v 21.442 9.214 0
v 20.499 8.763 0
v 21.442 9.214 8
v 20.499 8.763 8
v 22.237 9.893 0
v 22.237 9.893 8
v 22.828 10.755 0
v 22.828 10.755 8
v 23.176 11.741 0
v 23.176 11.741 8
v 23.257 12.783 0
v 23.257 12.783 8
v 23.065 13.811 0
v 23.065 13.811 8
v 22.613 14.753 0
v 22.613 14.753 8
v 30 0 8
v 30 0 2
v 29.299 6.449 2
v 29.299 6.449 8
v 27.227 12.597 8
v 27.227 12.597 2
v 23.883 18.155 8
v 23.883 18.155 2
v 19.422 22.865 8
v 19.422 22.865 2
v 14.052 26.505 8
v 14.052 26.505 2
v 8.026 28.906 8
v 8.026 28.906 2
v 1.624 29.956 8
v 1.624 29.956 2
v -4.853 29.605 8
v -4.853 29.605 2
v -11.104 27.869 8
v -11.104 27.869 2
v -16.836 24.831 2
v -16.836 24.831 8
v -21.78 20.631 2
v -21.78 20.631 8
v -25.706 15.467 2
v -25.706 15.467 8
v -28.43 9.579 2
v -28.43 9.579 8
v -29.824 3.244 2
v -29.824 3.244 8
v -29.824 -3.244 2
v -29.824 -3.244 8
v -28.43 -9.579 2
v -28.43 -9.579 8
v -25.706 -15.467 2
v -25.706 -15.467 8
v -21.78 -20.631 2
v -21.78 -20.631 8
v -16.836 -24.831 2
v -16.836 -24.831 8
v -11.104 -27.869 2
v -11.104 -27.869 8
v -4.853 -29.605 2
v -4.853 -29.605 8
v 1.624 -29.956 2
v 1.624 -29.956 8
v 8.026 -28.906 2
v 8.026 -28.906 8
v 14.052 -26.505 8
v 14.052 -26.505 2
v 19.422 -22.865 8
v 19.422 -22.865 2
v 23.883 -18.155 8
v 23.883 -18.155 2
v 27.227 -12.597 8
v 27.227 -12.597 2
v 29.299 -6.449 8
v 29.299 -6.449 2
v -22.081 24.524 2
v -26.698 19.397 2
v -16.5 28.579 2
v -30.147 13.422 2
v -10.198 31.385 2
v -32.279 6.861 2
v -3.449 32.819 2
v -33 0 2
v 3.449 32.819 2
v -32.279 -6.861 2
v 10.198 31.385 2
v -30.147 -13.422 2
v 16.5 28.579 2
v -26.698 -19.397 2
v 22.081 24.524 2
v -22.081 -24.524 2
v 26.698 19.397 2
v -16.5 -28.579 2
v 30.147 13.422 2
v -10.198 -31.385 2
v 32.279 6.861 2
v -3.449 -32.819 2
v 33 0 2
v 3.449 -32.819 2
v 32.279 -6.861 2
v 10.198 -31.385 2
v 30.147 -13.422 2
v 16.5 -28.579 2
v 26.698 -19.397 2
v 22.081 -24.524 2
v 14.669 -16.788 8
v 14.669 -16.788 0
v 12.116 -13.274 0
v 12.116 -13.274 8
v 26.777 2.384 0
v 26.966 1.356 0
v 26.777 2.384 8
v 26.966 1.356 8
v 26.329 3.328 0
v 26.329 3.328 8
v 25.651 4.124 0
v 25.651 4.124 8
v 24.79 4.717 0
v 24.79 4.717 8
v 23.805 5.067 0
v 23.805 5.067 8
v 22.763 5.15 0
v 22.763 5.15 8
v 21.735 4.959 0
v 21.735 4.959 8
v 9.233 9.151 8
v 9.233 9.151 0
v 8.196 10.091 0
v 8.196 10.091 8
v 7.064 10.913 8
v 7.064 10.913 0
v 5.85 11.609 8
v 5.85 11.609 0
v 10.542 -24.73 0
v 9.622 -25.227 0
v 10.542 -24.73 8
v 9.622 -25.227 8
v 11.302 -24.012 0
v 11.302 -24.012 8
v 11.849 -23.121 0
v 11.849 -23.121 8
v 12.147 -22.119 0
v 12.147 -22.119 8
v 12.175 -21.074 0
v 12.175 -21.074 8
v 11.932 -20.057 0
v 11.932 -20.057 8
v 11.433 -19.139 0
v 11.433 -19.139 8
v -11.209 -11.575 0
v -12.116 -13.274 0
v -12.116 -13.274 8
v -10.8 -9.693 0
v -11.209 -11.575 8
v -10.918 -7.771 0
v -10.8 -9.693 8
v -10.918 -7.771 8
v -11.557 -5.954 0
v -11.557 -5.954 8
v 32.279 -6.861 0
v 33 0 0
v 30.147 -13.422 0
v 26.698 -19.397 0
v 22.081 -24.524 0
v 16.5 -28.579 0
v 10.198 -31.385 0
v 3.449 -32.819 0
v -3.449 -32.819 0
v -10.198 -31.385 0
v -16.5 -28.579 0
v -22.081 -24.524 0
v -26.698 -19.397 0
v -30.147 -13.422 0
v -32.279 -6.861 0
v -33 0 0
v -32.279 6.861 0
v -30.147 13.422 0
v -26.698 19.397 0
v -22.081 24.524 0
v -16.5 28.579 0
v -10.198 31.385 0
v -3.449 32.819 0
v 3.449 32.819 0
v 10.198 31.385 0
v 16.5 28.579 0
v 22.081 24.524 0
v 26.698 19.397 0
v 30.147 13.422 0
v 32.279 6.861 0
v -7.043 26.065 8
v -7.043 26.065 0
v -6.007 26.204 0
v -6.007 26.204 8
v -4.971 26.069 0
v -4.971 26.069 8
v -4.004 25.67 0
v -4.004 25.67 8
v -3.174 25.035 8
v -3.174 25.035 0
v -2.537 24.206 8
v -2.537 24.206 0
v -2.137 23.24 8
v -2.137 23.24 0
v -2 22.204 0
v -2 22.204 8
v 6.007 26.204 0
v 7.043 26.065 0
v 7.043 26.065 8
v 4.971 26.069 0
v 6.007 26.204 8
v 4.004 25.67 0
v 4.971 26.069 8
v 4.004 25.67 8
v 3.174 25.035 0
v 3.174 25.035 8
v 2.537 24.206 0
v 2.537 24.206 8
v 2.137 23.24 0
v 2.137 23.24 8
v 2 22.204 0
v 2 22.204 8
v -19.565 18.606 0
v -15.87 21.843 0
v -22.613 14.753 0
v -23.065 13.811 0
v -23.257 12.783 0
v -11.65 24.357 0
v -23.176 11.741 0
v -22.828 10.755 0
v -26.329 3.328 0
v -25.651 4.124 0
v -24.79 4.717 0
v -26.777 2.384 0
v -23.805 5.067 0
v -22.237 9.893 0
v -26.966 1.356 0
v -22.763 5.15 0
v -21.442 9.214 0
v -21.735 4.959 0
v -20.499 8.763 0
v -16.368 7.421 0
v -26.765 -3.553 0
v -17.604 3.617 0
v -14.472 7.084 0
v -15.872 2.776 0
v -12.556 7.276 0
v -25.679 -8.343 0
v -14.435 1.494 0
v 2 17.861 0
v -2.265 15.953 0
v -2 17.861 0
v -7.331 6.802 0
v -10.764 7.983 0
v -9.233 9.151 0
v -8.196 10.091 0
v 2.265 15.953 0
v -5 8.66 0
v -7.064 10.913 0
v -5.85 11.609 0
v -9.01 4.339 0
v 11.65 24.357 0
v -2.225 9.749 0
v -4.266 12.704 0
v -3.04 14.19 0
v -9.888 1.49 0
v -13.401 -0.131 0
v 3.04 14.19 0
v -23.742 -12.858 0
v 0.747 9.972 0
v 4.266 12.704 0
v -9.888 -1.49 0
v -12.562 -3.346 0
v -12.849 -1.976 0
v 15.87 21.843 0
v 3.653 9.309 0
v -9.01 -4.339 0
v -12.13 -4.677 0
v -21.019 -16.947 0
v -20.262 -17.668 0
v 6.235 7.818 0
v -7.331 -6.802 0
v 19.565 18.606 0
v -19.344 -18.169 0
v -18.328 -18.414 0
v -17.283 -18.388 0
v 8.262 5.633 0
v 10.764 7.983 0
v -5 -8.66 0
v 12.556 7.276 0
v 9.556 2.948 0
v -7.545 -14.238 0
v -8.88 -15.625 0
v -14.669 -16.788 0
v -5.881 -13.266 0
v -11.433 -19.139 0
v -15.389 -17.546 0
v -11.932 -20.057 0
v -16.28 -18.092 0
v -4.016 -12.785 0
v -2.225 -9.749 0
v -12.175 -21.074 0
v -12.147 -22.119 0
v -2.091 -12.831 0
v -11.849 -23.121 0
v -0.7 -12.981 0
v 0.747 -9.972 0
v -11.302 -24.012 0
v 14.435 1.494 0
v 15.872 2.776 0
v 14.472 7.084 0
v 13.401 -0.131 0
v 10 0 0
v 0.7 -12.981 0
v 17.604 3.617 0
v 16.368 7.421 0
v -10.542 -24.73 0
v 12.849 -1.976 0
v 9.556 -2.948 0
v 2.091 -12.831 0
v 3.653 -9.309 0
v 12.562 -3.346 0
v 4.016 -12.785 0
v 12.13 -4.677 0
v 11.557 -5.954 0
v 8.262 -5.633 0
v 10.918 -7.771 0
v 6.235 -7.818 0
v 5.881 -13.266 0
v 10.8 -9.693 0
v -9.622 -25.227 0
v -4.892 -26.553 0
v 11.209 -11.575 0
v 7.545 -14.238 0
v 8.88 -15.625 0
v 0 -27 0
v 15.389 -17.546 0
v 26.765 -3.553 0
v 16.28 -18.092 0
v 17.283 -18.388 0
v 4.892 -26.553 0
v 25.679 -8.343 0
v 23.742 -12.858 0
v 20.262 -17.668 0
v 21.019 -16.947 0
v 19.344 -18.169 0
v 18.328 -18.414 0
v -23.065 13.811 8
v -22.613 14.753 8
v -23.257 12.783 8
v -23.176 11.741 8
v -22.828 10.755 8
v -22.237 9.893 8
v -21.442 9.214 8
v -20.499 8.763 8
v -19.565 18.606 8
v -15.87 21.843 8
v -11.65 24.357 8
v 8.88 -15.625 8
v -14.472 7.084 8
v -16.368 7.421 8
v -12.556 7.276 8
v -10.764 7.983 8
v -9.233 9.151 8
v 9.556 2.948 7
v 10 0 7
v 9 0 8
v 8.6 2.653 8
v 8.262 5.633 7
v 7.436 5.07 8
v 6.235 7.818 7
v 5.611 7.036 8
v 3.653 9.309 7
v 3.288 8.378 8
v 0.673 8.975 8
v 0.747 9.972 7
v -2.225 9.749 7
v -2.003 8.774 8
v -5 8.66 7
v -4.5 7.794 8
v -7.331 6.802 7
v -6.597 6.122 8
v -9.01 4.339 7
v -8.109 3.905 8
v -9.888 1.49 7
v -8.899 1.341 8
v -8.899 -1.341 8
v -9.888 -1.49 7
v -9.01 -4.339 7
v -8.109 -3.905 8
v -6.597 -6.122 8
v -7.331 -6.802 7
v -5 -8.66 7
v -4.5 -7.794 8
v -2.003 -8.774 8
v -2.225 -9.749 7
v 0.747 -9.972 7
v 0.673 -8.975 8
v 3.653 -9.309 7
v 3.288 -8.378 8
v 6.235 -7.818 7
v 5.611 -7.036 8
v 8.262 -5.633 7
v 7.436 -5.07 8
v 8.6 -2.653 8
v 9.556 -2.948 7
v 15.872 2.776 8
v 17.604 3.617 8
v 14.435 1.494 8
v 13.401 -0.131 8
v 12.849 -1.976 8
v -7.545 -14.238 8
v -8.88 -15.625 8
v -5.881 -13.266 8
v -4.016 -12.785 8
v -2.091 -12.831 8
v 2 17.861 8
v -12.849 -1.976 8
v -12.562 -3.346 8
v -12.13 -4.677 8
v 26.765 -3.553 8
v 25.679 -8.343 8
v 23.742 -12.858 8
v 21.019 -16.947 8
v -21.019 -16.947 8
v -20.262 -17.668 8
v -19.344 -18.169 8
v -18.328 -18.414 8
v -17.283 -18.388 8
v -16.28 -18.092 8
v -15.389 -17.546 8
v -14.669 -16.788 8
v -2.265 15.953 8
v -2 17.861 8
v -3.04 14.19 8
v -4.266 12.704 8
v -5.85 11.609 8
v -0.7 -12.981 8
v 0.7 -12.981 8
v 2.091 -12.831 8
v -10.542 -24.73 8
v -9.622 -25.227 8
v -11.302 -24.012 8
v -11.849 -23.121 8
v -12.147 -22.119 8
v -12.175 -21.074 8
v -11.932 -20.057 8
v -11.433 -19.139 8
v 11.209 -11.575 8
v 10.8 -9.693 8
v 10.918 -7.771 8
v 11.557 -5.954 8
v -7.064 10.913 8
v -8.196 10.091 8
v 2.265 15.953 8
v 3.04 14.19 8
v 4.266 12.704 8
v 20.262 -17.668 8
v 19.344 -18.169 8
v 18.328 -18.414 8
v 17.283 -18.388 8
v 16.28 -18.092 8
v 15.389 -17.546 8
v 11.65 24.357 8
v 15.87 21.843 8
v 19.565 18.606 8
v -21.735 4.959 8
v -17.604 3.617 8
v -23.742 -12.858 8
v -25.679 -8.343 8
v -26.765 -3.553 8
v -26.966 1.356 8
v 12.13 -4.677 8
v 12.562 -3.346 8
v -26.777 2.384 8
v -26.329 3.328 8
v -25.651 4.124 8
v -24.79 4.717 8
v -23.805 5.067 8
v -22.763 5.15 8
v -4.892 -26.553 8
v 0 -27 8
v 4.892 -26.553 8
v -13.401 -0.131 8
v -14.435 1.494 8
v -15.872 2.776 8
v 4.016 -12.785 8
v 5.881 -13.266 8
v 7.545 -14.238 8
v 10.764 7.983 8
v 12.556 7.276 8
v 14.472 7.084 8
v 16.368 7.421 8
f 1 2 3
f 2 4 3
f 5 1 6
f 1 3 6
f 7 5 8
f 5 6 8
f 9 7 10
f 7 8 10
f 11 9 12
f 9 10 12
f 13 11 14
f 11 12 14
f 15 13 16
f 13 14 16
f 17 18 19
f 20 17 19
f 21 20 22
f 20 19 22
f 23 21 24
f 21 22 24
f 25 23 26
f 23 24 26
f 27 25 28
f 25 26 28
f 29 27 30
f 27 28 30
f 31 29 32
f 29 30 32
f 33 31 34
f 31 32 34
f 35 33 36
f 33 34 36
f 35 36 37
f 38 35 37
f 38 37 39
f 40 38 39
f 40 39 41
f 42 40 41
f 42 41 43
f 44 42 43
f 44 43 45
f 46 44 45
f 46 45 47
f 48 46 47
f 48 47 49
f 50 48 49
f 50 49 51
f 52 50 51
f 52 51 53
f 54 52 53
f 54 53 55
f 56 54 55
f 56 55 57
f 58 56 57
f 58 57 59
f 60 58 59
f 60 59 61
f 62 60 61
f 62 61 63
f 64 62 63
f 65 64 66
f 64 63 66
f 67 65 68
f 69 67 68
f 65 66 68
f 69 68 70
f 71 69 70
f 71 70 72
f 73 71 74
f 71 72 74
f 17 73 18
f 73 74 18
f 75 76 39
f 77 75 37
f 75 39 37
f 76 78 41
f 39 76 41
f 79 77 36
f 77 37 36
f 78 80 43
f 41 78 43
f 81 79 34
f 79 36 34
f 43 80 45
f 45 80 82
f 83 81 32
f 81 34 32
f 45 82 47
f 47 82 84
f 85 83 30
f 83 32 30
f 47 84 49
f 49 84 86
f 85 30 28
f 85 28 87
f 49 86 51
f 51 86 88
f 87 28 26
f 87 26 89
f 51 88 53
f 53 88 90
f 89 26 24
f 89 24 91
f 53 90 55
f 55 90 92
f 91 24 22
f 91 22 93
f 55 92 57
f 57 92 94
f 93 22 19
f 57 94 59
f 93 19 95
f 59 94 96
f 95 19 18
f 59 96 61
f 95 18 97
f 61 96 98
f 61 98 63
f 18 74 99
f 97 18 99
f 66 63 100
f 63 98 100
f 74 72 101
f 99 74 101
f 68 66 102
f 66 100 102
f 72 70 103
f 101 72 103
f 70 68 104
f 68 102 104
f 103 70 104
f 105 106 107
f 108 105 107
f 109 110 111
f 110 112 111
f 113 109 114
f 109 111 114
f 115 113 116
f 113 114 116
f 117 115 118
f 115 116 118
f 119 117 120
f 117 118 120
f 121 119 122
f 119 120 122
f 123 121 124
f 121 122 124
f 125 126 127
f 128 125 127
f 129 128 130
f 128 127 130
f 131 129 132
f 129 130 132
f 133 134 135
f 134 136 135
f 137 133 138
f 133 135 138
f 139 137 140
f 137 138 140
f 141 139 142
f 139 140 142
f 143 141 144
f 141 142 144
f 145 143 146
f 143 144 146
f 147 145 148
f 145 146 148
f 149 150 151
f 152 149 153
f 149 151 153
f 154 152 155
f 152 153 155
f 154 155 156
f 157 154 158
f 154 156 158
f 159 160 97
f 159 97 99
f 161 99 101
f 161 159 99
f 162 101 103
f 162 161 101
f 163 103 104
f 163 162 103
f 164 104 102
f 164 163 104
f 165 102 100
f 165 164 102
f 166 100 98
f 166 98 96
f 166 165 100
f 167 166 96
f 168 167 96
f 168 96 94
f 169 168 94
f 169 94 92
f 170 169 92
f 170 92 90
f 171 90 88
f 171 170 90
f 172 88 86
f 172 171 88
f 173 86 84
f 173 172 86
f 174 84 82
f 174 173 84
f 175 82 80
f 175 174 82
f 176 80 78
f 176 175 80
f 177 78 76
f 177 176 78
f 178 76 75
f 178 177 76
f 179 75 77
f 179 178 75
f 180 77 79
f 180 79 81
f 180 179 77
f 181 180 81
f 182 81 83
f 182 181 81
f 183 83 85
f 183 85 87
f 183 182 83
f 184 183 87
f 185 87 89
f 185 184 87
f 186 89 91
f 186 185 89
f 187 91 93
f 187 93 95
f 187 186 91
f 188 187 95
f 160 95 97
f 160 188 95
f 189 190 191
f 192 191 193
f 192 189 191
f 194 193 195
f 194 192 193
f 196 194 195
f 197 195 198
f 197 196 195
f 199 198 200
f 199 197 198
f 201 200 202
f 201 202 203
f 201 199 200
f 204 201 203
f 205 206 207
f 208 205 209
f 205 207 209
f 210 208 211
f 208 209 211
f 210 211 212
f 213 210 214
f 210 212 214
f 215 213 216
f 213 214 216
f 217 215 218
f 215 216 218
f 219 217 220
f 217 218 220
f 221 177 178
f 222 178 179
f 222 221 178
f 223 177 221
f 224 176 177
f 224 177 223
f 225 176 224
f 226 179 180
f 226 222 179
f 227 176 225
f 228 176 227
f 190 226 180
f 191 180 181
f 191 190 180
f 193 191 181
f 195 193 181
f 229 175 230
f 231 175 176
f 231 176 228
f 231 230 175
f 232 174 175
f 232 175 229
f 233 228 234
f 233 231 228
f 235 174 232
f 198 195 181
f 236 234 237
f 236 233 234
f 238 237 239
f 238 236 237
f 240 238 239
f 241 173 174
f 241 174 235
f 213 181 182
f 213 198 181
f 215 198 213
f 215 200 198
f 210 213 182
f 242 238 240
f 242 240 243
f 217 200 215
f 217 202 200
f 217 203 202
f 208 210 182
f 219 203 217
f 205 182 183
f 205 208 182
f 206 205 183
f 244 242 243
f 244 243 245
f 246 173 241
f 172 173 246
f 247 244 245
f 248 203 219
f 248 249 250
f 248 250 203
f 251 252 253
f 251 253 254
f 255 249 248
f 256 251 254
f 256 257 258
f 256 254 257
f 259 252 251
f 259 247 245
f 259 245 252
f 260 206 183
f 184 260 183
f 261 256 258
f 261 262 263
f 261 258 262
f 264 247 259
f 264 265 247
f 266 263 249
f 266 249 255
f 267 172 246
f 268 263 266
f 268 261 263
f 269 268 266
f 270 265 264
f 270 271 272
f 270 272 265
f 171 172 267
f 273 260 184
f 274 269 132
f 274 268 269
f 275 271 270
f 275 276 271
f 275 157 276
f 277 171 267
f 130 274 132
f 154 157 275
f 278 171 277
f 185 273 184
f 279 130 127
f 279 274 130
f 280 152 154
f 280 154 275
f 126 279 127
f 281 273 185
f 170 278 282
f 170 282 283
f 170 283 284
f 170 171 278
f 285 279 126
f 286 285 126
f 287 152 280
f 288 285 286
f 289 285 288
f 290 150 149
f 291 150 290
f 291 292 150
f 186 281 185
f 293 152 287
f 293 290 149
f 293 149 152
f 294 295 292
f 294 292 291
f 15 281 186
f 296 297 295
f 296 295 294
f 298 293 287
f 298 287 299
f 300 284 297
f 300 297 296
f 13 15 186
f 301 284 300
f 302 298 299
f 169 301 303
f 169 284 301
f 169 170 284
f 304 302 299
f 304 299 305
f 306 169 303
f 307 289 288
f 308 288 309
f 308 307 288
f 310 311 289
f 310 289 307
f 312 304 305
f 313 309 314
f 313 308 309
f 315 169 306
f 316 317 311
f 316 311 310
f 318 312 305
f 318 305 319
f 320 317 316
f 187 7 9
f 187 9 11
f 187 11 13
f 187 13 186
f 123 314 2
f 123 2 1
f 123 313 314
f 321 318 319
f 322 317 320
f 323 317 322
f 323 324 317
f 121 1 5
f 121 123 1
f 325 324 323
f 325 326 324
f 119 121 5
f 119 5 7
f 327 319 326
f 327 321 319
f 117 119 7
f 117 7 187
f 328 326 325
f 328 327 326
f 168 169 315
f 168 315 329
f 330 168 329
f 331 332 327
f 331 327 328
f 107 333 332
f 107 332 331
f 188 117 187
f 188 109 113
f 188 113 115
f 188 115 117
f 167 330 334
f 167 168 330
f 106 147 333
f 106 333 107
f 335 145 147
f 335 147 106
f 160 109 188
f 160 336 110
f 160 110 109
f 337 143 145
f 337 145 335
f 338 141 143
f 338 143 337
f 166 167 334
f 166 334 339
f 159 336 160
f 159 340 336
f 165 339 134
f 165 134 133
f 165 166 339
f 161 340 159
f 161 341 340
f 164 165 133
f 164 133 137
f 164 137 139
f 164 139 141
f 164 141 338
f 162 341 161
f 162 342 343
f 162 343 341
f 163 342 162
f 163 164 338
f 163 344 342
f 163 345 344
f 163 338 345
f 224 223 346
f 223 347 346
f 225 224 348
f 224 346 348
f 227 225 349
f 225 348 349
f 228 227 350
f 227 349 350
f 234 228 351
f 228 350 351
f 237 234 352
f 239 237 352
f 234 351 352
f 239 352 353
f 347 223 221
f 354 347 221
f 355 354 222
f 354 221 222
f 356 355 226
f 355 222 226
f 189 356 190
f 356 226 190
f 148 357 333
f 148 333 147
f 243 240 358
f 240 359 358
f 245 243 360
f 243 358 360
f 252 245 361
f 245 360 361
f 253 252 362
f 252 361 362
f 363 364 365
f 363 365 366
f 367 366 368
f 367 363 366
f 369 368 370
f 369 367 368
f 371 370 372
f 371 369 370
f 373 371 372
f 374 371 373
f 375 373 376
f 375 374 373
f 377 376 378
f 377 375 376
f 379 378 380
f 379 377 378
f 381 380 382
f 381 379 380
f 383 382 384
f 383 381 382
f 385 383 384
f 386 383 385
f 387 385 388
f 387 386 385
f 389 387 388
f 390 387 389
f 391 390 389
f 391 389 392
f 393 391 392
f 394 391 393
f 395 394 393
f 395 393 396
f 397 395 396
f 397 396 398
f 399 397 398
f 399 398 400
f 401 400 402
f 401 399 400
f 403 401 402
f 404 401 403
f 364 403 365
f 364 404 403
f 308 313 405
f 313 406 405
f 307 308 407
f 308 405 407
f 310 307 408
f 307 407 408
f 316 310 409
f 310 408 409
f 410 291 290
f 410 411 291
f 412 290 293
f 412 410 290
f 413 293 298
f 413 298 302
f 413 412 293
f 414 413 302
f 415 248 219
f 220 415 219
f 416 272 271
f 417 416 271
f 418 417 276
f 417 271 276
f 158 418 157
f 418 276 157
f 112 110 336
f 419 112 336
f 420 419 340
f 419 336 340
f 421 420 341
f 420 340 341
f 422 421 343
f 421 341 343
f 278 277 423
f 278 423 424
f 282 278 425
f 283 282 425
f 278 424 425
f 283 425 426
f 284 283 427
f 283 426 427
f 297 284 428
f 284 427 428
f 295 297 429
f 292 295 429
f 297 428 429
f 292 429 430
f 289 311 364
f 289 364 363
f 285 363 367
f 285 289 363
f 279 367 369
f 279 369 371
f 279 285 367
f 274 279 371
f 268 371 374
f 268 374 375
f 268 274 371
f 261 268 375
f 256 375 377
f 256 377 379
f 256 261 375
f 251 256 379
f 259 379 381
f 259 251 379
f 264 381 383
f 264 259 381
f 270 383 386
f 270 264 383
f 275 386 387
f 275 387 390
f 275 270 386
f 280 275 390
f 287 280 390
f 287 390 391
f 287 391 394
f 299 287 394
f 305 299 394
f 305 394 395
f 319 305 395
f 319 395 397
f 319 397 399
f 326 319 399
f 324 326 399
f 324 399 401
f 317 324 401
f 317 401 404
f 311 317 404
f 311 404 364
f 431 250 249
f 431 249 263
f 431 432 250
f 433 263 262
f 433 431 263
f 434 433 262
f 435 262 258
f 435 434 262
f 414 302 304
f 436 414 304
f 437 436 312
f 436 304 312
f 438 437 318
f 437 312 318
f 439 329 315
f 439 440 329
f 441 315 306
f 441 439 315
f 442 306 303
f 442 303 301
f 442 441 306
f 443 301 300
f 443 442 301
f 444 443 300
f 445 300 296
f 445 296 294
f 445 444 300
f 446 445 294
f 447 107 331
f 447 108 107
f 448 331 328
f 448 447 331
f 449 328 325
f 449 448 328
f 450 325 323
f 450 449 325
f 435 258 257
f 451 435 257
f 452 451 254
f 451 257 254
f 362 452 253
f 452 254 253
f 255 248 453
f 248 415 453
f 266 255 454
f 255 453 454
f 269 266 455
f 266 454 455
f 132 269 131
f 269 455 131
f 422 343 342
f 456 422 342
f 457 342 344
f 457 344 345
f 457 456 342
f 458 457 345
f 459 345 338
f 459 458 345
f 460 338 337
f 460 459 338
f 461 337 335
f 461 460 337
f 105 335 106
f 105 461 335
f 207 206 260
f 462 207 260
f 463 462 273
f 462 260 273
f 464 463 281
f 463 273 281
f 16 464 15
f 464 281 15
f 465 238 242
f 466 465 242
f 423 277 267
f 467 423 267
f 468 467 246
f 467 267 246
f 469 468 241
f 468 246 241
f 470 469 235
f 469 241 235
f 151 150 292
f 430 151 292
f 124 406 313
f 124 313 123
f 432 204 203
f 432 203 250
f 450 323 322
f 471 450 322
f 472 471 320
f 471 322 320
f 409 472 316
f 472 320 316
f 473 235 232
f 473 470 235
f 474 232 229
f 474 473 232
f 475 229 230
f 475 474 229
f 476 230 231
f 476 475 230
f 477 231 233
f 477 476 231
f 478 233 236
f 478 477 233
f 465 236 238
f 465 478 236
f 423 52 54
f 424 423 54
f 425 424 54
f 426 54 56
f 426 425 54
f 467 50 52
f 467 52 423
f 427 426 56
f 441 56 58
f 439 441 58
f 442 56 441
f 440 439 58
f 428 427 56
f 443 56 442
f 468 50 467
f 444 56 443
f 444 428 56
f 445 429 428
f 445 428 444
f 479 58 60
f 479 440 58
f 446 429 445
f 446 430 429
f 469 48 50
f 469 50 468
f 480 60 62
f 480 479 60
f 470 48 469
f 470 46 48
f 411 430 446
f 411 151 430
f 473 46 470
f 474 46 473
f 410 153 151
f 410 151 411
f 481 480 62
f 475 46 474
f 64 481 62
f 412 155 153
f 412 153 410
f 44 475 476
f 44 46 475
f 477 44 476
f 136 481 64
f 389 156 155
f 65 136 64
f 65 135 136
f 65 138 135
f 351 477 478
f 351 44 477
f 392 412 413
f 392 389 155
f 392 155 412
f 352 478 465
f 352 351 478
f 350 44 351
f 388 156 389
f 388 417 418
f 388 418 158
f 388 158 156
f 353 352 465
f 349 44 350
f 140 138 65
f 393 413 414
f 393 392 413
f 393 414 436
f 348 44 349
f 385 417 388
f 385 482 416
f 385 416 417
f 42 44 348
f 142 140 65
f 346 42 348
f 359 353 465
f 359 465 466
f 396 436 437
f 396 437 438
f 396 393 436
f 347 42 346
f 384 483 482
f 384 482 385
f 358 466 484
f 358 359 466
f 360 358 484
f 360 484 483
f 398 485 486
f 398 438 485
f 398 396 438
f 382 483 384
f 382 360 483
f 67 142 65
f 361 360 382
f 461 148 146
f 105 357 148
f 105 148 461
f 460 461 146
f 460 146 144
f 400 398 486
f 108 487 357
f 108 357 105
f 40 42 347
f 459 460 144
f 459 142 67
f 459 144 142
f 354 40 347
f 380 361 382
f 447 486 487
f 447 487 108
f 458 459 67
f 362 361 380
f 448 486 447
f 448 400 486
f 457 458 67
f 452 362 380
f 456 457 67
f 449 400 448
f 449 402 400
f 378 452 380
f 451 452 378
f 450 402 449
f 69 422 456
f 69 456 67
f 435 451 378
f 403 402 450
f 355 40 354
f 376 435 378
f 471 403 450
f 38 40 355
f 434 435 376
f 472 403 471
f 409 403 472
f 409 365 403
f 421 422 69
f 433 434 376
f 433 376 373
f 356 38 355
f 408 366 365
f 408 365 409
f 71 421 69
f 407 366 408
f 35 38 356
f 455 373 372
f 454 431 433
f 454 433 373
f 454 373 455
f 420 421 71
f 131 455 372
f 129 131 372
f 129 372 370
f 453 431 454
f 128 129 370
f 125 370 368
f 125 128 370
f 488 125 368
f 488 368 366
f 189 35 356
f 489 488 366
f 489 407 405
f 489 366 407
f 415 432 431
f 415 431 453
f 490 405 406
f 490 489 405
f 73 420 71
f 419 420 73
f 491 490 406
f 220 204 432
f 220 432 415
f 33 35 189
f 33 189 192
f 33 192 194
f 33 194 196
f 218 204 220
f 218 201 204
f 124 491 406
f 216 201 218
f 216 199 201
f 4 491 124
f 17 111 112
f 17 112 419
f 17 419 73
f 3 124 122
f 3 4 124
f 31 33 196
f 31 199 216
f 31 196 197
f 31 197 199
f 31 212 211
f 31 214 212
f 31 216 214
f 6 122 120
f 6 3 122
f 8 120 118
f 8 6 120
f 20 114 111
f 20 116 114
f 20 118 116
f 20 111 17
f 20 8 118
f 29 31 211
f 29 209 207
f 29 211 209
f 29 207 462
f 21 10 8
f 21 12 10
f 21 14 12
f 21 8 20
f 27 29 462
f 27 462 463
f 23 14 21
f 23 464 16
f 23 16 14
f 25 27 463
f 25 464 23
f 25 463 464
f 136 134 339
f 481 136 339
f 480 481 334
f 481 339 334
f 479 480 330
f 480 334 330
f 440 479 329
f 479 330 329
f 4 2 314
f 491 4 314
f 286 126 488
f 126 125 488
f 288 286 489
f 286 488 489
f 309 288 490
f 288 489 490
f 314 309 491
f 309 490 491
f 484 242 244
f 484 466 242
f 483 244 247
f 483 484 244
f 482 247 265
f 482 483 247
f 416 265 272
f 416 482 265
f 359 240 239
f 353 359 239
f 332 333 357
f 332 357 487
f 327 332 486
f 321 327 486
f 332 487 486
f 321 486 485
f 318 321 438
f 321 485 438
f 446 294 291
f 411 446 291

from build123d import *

# Parameters (mm, degrees)
F0_R     = 30
F0_R_2   = 10
F1_DEPTH = 8
F2_R     = 33
F2_R_2   = 30
F3_DEPTH = 2
F4_R     = 10
F4_R_2   = 9
F5_DEPTH = 1
F6_R     = 4
F7_R     = 7
F8_SIZE  = 0.99999


# Not quite as in the source:
# - a fillet or chamfer is up to 0.001 mm smaller than in the source, because OpenCascade refuses the exact size


with BuildPart() as f1:
    # F0 (on Top) → F1 (new body)
    with BuildSketch(Plane.XY):
        Circle(F0_R)
        with BuildLine():
            Line((-14.2085682852, -22.959019737), (-5.9322042833, -11.5675819574))
            ThreePointArc((-5.9322042833, -11.5675819574), (0, -13), (5.9322042833, -11.5675819574))
            Line((5.9322042833, -11.5675819574), (14.2085682852, -22.959019737))
            ThreePointArc((14.2085682852, -22.959019737), (0, -27), (-14.2085682852, -22.959019737))
        make_face(mode=Mode.SUBTRACT)
        with BuildLine():
            Line((-26.2260143945, 6.418424182), (-12.834576136, 2.0672821309))
            ThreePointArc((-12.834576136, 2.0672821309), (-12.3637347118, -4.0172209269), (-9.1682722608, -9.2164409483))
            Line((-9.1682722608, -9.2164409483), (-17.4446362627, -20.6078787278))
            ThreePointArc((-17.4446362627, -20.6078787278), (-25.67852594, -8.3434588481), (-26.2260143945, 6.418424182))
        make_face(mode=Mode.SUBTRACT)
        with BuildLine():
            Line((17.4446362627, -20.6078787278), (9.1682722608, -9.2164409483))
            ThreePointArc((9.1682722608, -9.2164409483), (12.3637347118, -4.0172209269), (12.834576136, 2.0672821309))
            Line((12.834576136, 2.0672821309), (26.2260143945, 6.418424182))
            ThreePointArc((26.2260143945, 6.418424182), (25.67852594, -8.3434588481), (17.4446362627, -20.6078787278))
        make_face(mode=Mode.SUBTRACT)
        with BuildLine():
            Line((-2, 26.9258240357), (-2, 12.8452325787))
            ThreePointArc((-2, 12.8452325787), (-7.6412082798, 10.5172209269), (-11.5985081585, 5.8715081961))
            Line((-11.5985081585, 5.8715081961), (-24.989946417, 10.2226502472))
            ThreePointArc((-24.989946417, 10.2226502472), (-15.8702018119, 21.8434588481), (-2, 26.9258240357))
        make_face(mode=Mode.SUBTRACT)
        Circle(F0_R_2, mode=Mode.SUBTRACT)
        with BuildLine():
            ThreePointArc((11.5985081585, 5.8715081961), (7.6412082798, 10.5172209269), (2, 12.8452325787))
            Line((2, 12.8452325787), (2, 26.9258240357))
            ThreePointArc((2, 26.9258240357), (15.8702018119, 21.8434588481), (24.989946417, 10.2226502472))
            Line((24.989946417, 10.2226502472), (11.5985081585, 5.8715081961))
        make_face(mode=Mode.SUBTRACT)
    extrude(amount=F1_DEPTH)

    # F2 (on face) → F3 (join)
    with BuildSketch(Plane(origin=(0, 0, 0), x_dir=(1, 0, 0), z_dir=(0, 0, -1))):
        Circle(F2_R)
        Circle(F2_R_2, mode=Mode.SUBTRACT)
    extrude(amount=-F3_DEPTH)

    # F4 (on face) → F5 (join)
    with BuildSketch(Plane.XY.offset(8)):
        Circle(F4_R)
        Circle(F4_R_2, mode=Mode.SUBTRACT)
    extrude(amount=-F5_DEPTH)

    # F6
    f6_edges = [f1.edges().sort_by_distance(p)[0] for p in [
        (-26.226014, 6.418424, 4),
        (-24.989946, 10.22265, 4),
        (-17.444636, -20.607879, 4),
        (17.444636, -20.607879, 4),
        (26.226014, 6.418424, 4),
        (-2, 26.925824, 4),
        (-14.208568, -22.95902, 4),
        (14.208568, -22.95902, 4),
        (24.989946, 10.22265, 4),
        (2, 26.925824, 4),
    ]]
    fillet(f6_edges, radius=F6_R)

    # F7
    f7_edges = [f1.edges().sort_by_distance(p)[0] for p in [
        (-12.834576, 2.067282, 4),
        (-9.168272, -9.216441, 4),
        (-5.932204, -11.567582, 4),
        (5.932204, -11.567582, 4),
        (9.168272, -9.216441, 4),
        (12.834576, 2.067282, 4),
        (11.598508, 5.871508, 4),
        (2, 12.845233, 4),
        (-2, 12.845233, 4),
        (-11.598508, 5.871508, 4),
    ]]
    fillet(f7_edges, radius=F7_R)

    # F8 (size 1 in the source; OpenCascade refuses exactly that, so slightly less here)
    f8_edges = [f1.edges().sort_by_distance(p)[0] for p in [
        (-9, 0, 7),
    ]]
    chamfer(f8_edges, length=F8_SIZE)


solid = f1.part
